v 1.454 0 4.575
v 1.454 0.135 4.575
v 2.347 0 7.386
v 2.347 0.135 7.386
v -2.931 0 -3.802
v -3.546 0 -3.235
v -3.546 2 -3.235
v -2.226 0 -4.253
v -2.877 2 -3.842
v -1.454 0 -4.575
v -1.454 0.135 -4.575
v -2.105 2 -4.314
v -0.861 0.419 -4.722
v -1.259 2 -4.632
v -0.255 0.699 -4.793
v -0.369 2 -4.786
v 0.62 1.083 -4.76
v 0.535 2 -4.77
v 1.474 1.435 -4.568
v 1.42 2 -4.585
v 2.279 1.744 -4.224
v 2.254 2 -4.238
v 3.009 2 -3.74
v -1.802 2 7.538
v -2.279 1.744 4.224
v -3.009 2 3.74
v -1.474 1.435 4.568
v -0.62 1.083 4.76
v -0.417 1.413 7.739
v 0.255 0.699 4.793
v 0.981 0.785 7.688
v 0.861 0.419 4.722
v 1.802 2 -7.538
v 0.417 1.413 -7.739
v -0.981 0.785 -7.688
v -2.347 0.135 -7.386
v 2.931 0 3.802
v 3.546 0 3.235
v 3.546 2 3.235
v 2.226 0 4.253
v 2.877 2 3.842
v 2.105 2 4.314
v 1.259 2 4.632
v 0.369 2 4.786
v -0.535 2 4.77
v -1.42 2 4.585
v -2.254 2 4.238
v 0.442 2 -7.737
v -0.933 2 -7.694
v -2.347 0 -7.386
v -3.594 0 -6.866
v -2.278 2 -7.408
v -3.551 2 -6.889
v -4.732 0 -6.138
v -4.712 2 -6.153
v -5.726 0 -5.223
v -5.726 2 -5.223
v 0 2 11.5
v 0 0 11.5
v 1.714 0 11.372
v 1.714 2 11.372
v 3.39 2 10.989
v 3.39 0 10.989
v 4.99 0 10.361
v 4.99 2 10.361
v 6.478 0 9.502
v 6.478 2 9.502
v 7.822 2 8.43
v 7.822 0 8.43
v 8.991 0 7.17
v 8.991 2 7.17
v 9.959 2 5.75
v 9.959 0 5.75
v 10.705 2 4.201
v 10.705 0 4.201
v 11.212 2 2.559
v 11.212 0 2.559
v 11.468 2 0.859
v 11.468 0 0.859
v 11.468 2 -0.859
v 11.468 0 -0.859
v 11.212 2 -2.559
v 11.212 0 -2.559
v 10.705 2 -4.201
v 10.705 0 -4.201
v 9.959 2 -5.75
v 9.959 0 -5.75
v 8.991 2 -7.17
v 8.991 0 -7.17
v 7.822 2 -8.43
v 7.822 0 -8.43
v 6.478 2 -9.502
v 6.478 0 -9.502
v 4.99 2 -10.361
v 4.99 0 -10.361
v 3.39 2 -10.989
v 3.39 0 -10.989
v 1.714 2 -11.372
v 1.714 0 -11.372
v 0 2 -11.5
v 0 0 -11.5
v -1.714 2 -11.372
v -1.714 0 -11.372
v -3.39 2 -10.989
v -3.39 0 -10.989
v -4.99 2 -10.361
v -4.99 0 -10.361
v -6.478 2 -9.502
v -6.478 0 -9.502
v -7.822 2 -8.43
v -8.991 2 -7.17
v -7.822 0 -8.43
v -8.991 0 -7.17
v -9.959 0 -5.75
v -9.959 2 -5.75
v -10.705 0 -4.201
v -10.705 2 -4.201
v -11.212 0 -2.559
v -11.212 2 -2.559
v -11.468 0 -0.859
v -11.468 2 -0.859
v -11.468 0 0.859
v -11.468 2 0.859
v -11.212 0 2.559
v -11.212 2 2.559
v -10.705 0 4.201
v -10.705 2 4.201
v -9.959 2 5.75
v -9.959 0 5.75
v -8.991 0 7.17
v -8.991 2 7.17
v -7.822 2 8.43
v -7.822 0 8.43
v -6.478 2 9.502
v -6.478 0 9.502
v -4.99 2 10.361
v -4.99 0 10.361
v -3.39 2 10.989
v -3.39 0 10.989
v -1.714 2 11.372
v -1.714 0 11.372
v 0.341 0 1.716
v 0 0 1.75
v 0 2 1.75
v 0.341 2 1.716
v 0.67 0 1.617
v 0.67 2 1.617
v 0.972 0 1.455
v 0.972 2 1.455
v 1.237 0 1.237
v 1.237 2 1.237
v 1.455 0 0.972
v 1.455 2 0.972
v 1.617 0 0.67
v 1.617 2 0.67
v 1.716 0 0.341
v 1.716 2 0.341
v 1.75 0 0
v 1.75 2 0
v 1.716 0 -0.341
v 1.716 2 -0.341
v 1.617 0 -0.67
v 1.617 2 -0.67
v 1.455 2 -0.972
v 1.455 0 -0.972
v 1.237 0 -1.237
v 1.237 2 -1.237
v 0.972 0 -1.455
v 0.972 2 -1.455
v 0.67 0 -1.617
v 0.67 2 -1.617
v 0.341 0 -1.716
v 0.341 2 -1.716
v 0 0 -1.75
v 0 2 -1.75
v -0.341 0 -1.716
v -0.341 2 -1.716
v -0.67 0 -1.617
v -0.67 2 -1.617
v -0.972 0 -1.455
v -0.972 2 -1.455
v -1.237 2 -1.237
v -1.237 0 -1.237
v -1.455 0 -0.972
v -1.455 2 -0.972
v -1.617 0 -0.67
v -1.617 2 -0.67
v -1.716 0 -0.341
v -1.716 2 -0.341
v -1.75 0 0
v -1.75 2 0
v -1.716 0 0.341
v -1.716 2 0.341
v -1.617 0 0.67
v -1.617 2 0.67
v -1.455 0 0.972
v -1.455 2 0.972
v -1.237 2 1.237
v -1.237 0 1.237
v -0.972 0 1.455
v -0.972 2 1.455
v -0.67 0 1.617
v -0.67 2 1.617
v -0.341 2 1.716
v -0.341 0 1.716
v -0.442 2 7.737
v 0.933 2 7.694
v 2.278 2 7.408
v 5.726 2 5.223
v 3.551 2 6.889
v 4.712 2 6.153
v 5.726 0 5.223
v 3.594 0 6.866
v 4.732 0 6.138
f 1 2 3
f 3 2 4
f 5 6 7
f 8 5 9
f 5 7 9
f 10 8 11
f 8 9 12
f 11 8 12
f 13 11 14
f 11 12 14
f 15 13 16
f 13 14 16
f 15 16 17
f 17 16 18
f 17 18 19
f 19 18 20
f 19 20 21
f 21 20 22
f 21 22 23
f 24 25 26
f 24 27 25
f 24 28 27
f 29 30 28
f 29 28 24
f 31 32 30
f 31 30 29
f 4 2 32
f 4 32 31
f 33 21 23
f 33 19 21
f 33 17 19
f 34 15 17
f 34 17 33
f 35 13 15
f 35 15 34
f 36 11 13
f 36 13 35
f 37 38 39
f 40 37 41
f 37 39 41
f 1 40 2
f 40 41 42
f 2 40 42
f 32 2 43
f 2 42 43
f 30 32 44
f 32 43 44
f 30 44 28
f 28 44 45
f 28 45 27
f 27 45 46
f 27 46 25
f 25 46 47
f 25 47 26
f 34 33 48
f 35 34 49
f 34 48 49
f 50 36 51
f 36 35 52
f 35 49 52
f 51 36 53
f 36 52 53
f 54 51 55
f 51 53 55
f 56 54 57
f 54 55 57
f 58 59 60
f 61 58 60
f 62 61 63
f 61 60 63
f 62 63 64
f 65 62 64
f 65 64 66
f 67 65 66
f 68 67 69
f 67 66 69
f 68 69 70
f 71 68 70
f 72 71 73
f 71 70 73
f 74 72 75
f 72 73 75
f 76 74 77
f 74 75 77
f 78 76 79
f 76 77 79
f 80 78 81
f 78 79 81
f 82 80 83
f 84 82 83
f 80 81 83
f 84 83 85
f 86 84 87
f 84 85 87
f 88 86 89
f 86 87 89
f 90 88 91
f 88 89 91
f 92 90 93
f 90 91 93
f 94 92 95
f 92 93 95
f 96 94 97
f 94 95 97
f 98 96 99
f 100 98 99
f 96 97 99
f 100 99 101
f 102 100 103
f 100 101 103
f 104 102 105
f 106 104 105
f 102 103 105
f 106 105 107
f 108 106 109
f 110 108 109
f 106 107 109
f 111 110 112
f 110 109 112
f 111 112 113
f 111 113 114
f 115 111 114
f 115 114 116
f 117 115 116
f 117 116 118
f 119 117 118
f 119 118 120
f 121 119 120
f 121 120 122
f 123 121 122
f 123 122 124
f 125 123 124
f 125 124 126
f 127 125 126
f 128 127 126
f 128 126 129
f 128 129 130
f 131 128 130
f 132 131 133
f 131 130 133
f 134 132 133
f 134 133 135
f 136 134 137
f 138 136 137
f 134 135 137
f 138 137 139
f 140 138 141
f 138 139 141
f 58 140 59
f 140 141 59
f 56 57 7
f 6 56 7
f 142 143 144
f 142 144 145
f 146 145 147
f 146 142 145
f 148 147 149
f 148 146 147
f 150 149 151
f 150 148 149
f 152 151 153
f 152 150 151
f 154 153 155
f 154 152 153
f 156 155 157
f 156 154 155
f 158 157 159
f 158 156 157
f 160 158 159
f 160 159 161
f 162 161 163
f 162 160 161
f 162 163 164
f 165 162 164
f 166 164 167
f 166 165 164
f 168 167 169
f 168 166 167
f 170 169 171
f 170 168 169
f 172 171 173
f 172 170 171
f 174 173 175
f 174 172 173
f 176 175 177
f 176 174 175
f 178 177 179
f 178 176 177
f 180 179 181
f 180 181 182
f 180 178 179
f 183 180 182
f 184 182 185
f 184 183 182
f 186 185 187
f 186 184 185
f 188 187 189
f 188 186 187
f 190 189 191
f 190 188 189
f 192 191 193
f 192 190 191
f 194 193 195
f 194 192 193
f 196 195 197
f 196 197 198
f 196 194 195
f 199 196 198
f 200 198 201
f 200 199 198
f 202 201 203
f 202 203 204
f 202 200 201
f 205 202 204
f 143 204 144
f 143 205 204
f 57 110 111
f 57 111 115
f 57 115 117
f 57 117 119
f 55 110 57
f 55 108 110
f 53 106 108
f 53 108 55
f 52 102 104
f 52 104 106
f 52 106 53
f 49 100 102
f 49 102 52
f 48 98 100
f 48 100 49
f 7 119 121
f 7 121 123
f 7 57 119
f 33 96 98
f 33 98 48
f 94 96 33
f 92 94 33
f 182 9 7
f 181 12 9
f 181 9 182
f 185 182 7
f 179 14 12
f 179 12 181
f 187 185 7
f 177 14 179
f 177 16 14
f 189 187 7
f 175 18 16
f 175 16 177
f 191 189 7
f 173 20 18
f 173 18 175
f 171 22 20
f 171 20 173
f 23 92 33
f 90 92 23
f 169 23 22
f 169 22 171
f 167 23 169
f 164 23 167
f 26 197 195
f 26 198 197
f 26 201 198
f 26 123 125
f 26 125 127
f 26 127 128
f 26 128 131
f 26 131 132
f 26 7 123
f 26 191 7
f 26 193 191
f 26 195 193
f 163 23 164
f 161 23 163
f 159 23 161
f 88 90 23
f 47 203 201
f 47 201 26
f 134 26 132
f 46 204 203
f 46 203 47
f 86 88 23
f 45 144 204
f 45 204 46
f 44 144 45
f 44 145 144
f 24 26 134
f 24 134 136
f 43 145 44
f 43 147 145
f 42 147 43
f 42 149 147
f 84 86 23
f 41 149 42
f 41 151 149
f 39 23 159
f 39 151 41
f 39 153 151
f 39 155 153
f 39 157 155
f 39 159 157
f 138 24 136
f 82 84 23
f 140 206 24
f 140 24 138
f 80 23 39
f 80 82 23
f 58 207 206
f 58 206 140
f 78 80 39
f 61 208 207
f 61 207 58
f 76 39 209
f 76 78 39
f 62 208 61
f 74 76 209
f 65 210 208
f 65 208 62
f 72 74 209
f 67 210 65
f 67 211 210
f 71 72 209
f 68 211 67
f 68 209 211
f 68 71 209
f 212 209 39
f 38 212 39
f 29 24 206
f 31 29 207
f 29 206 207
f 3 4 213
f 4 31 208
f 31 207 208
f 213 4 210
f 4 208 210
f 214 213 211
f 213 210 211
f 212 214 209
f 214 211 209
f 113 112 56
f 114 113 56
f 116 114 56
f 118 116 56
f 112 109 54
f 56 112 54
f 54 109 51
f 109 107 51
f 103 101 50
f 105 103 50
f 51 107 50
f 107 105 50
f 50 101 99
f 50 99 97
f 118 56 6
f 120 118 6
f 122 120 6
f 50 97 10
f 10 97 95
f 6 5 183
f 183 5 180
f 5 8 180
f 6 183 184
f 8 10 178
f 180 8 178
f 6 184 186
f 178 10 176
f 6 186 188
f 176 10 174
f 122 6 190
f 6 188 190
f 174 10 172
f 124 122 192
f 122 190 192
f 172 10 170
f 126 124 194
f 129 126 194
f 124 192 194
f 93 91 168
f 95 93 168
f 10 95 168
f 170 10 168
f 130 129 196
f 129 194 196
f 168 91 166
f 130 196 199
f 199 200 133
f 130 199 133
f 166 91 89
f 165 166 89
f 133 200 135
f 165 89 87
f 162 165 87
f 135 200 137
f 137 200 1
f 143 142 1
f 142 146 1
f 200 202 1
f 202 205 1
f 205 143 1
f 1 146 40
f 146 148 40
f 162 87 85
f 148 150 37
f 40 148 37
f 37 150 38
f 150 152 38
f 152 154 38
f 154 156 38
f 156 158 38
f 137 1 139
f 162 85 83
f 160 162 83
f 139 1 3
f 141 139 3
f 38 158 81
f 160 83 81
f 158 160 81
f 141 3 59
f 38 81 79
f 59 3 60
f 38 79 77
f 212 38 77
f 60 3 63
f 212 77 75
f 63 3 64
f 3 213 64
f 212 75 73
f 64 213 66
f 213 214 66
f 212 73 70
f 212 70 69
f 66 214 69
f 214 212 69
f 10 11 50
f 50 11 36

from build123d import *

# Parameters (mm, degrees)
SKETCH1_R           = 11.5
SKETCH1_R_2         = 1.75
BOSS_EXTRUDE1_DEPTH = 2
CUT_EXTRUDE1_DEPTH  = 2
CHAMFER1_SIZE       = 4
CHAMFER1_SIZE2      = 1.865230633
CHAMFER2_SIZE       = 4
CHAMFER2_SIZE2      = 1.865230633


with BuildPart() as part:
    # Sketch1 → Boss-Extrude1 (new body)
    with BuildSketch(Plane(origin=(0, 0, 0), x_dir=(1, 0, 0), z_dir=(0, 1, 0))):
        with Locations(Location((0, 0, 0), (0, 0, 270))):
            Circle(SKETCH1_R)
        with Locations(Location((0, 0, 0), (0, 0, 270))):
            Circle(SKETCH1_R_2, mode=Mode.SUBTRACT)
    extrude(amount=BOSS_EXTRUDE1_DEPTH)

    # Sketch2 → Cut-Extrude1 (cut)
    with BuildSketch(Plane(origin=(0, 2, 0), x_dir=(1, 0, 0), z_dir=(0, 1, 0))):
        with BuildLine():
            Line((-1.45362124, 4.5746022), (-2.346992627, 7.386076469))
            ThreePointArc((-2.346992627, 7.386076469), (-4.178678051, 6.526955626), (-5.725593472, 5.223033543))
            Line((-5.725593472, 5.223033543), (-3.546174021, 3.234911098))
            ThreePointArc((-3.546174021, 3.234911098), (-2.58808447, 4.042501549), (-1.45362124, 4.5746022))
        make_face()
        with BuildLine():
            Line((5.725593472, -5.223033543), (3.546174021, -3.234911098))
            ThreePointArc((3.546174021, -3.234911098), (2.58808447, -4.042501549), (1.45362124, -4.5746022))
            Line((1.45362124, -4.5746022), (2.346992627, -7.386076469))
            ThreePointArc((2.346992627, -7.386076469), (4.178678051, -6.526955626), (5.725593472, -5.223033543))
        make_face()
    extrude(amount=-CUT_EXTRUDE1_DEPTH, mode=Mode.SUBTRACT)

    # Chamfer1
    chamfer1_edges = [part.edges().sort_by_distance(p)[0] for p in [
        (-1.900306933, 2, -5.980339335),
    ]]
    chamfer1_side = [part.faces().sort_by_distance(p)[0] for p in [
        (0, 2, -11.174730881),
    ]]
    chamfer(chamfer1_edges, length=CHAMFER1_SIZE, length2=CHAMFER1_SIZE2, reference=chamfer1_side[0])

    # Chamfer2
    chamfer2_edges = [part.edges().sort_by_distance(p)[0] for p in [
        (1.900306933, 2, 5.980339335),
    ]]
    chamfer2_side = [part.faces().sort_by_distance(p)[0] for p in [
        (-0.343824977, 2, -4.461502083),
    ]]
    chamfer(chamfer2_edges, length=CHAMFER2_SIZE, length2=CHAMFER2_SIZE2, reference=chamfer2_side[0])


solid = part.part
